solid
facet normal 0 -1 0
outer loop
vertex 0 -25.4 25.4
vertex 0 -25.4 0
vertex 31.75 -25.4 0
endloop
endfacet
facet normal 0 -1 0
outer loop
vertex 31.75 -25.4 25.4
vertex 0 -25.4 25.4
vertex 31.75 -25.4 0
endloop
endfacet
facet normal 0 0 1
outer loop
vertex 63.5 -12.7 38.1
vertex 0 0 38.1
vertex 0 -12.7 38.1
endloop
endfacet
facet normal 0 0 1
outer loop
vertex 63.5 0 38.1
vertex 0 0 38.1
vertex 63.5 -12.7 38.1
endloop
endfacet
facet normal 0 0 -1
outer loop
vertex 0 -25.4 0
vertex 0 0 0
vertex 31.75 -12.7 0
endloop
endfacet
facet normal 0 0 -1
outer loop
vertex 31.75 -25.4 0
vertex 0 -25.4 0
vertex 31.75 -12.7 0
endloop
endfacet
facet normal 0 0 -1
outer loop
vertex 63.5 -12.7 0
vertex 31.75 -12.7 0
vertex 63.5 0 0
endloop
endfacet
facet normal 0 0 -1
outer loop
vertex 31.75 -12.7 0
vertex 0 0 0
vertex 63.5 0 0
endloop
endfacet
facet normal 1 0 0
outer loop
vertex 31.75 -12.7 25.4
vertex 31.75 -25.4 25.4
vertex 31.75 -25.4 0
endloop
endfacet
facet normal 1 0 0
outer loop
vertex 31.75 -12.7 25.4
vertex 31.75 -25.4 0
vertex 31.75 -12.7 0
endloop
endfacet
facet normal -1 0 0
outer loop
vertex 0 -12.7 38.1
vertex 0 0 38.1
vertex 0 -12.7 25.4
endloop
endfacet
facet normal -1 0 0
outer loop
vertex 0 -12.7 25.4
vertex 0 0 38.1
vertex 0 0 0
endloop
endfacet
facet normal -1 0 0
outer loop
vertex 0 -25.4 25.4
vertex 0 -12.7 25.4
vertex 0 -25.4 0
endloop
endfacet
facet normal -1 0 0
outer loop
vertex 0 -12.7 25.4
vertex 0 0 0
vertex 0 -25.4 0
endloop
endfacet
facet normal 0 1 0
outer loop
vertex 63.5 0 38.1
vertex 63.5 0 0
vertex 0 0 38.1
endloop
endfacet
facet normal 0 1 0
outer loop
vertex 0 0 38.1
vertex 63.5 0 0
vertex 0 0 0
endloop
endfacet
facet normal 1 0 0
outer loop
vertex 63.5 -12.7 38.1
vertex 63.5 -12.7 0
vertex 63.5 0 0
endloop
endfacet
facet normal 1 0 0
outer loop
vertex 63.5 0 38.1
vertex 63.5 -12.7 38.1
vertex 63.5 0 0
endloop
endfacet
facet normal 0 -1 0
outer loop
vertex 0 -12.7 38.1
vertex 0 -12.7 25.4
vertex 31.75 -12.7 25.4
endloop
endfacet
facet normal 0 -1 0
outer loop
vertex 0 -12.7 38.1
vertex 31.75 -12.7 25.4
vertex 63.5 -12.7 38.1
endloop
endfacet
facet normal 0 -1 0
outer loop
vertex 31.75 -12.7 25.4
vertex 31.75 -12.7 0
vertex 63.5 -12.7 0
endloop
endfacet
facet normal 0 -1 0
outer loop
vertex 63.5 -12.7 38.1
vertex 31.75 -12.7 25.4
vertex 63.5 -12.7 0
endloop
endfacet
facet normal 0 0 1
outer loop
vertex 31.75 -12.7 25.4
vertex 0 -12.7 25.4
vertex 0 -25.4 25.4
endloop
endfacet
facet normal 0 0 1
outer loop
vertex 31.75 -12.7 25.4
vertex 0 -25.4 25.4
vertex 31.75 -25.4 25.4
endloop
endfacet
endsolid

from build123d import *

# Parameters (mm, degrees)
F1_DEPTH = 38.1
F0_W     = 31.75
F0_H     = 12.7
F2_DEPTH = 25.4


with BuildPart() as f1:
    # F0 (on Top) → F1 (new body)
    with BuildSketch(Plane.XY):
        Polygon((63.5, 0), (0, 0), (0, -12.7), (31.75, -12.7), (63.5, -12.7), align=None)
    extrude(amount=F1_DEPTH)

    # F0 (on Top) → F2 (join)
    with BuildSketch(Plane.XY):
        Polygon((63.5, 0), (0, 0), (0, -12.7), (31.75, -12.7), (63.5, -12.7), align=None)
        with Locations((15.875, -19.05)):
            Rectangle(F0_W, F0_H)
    extrude(amount=F2_DEPTH)


solid = f1.part
